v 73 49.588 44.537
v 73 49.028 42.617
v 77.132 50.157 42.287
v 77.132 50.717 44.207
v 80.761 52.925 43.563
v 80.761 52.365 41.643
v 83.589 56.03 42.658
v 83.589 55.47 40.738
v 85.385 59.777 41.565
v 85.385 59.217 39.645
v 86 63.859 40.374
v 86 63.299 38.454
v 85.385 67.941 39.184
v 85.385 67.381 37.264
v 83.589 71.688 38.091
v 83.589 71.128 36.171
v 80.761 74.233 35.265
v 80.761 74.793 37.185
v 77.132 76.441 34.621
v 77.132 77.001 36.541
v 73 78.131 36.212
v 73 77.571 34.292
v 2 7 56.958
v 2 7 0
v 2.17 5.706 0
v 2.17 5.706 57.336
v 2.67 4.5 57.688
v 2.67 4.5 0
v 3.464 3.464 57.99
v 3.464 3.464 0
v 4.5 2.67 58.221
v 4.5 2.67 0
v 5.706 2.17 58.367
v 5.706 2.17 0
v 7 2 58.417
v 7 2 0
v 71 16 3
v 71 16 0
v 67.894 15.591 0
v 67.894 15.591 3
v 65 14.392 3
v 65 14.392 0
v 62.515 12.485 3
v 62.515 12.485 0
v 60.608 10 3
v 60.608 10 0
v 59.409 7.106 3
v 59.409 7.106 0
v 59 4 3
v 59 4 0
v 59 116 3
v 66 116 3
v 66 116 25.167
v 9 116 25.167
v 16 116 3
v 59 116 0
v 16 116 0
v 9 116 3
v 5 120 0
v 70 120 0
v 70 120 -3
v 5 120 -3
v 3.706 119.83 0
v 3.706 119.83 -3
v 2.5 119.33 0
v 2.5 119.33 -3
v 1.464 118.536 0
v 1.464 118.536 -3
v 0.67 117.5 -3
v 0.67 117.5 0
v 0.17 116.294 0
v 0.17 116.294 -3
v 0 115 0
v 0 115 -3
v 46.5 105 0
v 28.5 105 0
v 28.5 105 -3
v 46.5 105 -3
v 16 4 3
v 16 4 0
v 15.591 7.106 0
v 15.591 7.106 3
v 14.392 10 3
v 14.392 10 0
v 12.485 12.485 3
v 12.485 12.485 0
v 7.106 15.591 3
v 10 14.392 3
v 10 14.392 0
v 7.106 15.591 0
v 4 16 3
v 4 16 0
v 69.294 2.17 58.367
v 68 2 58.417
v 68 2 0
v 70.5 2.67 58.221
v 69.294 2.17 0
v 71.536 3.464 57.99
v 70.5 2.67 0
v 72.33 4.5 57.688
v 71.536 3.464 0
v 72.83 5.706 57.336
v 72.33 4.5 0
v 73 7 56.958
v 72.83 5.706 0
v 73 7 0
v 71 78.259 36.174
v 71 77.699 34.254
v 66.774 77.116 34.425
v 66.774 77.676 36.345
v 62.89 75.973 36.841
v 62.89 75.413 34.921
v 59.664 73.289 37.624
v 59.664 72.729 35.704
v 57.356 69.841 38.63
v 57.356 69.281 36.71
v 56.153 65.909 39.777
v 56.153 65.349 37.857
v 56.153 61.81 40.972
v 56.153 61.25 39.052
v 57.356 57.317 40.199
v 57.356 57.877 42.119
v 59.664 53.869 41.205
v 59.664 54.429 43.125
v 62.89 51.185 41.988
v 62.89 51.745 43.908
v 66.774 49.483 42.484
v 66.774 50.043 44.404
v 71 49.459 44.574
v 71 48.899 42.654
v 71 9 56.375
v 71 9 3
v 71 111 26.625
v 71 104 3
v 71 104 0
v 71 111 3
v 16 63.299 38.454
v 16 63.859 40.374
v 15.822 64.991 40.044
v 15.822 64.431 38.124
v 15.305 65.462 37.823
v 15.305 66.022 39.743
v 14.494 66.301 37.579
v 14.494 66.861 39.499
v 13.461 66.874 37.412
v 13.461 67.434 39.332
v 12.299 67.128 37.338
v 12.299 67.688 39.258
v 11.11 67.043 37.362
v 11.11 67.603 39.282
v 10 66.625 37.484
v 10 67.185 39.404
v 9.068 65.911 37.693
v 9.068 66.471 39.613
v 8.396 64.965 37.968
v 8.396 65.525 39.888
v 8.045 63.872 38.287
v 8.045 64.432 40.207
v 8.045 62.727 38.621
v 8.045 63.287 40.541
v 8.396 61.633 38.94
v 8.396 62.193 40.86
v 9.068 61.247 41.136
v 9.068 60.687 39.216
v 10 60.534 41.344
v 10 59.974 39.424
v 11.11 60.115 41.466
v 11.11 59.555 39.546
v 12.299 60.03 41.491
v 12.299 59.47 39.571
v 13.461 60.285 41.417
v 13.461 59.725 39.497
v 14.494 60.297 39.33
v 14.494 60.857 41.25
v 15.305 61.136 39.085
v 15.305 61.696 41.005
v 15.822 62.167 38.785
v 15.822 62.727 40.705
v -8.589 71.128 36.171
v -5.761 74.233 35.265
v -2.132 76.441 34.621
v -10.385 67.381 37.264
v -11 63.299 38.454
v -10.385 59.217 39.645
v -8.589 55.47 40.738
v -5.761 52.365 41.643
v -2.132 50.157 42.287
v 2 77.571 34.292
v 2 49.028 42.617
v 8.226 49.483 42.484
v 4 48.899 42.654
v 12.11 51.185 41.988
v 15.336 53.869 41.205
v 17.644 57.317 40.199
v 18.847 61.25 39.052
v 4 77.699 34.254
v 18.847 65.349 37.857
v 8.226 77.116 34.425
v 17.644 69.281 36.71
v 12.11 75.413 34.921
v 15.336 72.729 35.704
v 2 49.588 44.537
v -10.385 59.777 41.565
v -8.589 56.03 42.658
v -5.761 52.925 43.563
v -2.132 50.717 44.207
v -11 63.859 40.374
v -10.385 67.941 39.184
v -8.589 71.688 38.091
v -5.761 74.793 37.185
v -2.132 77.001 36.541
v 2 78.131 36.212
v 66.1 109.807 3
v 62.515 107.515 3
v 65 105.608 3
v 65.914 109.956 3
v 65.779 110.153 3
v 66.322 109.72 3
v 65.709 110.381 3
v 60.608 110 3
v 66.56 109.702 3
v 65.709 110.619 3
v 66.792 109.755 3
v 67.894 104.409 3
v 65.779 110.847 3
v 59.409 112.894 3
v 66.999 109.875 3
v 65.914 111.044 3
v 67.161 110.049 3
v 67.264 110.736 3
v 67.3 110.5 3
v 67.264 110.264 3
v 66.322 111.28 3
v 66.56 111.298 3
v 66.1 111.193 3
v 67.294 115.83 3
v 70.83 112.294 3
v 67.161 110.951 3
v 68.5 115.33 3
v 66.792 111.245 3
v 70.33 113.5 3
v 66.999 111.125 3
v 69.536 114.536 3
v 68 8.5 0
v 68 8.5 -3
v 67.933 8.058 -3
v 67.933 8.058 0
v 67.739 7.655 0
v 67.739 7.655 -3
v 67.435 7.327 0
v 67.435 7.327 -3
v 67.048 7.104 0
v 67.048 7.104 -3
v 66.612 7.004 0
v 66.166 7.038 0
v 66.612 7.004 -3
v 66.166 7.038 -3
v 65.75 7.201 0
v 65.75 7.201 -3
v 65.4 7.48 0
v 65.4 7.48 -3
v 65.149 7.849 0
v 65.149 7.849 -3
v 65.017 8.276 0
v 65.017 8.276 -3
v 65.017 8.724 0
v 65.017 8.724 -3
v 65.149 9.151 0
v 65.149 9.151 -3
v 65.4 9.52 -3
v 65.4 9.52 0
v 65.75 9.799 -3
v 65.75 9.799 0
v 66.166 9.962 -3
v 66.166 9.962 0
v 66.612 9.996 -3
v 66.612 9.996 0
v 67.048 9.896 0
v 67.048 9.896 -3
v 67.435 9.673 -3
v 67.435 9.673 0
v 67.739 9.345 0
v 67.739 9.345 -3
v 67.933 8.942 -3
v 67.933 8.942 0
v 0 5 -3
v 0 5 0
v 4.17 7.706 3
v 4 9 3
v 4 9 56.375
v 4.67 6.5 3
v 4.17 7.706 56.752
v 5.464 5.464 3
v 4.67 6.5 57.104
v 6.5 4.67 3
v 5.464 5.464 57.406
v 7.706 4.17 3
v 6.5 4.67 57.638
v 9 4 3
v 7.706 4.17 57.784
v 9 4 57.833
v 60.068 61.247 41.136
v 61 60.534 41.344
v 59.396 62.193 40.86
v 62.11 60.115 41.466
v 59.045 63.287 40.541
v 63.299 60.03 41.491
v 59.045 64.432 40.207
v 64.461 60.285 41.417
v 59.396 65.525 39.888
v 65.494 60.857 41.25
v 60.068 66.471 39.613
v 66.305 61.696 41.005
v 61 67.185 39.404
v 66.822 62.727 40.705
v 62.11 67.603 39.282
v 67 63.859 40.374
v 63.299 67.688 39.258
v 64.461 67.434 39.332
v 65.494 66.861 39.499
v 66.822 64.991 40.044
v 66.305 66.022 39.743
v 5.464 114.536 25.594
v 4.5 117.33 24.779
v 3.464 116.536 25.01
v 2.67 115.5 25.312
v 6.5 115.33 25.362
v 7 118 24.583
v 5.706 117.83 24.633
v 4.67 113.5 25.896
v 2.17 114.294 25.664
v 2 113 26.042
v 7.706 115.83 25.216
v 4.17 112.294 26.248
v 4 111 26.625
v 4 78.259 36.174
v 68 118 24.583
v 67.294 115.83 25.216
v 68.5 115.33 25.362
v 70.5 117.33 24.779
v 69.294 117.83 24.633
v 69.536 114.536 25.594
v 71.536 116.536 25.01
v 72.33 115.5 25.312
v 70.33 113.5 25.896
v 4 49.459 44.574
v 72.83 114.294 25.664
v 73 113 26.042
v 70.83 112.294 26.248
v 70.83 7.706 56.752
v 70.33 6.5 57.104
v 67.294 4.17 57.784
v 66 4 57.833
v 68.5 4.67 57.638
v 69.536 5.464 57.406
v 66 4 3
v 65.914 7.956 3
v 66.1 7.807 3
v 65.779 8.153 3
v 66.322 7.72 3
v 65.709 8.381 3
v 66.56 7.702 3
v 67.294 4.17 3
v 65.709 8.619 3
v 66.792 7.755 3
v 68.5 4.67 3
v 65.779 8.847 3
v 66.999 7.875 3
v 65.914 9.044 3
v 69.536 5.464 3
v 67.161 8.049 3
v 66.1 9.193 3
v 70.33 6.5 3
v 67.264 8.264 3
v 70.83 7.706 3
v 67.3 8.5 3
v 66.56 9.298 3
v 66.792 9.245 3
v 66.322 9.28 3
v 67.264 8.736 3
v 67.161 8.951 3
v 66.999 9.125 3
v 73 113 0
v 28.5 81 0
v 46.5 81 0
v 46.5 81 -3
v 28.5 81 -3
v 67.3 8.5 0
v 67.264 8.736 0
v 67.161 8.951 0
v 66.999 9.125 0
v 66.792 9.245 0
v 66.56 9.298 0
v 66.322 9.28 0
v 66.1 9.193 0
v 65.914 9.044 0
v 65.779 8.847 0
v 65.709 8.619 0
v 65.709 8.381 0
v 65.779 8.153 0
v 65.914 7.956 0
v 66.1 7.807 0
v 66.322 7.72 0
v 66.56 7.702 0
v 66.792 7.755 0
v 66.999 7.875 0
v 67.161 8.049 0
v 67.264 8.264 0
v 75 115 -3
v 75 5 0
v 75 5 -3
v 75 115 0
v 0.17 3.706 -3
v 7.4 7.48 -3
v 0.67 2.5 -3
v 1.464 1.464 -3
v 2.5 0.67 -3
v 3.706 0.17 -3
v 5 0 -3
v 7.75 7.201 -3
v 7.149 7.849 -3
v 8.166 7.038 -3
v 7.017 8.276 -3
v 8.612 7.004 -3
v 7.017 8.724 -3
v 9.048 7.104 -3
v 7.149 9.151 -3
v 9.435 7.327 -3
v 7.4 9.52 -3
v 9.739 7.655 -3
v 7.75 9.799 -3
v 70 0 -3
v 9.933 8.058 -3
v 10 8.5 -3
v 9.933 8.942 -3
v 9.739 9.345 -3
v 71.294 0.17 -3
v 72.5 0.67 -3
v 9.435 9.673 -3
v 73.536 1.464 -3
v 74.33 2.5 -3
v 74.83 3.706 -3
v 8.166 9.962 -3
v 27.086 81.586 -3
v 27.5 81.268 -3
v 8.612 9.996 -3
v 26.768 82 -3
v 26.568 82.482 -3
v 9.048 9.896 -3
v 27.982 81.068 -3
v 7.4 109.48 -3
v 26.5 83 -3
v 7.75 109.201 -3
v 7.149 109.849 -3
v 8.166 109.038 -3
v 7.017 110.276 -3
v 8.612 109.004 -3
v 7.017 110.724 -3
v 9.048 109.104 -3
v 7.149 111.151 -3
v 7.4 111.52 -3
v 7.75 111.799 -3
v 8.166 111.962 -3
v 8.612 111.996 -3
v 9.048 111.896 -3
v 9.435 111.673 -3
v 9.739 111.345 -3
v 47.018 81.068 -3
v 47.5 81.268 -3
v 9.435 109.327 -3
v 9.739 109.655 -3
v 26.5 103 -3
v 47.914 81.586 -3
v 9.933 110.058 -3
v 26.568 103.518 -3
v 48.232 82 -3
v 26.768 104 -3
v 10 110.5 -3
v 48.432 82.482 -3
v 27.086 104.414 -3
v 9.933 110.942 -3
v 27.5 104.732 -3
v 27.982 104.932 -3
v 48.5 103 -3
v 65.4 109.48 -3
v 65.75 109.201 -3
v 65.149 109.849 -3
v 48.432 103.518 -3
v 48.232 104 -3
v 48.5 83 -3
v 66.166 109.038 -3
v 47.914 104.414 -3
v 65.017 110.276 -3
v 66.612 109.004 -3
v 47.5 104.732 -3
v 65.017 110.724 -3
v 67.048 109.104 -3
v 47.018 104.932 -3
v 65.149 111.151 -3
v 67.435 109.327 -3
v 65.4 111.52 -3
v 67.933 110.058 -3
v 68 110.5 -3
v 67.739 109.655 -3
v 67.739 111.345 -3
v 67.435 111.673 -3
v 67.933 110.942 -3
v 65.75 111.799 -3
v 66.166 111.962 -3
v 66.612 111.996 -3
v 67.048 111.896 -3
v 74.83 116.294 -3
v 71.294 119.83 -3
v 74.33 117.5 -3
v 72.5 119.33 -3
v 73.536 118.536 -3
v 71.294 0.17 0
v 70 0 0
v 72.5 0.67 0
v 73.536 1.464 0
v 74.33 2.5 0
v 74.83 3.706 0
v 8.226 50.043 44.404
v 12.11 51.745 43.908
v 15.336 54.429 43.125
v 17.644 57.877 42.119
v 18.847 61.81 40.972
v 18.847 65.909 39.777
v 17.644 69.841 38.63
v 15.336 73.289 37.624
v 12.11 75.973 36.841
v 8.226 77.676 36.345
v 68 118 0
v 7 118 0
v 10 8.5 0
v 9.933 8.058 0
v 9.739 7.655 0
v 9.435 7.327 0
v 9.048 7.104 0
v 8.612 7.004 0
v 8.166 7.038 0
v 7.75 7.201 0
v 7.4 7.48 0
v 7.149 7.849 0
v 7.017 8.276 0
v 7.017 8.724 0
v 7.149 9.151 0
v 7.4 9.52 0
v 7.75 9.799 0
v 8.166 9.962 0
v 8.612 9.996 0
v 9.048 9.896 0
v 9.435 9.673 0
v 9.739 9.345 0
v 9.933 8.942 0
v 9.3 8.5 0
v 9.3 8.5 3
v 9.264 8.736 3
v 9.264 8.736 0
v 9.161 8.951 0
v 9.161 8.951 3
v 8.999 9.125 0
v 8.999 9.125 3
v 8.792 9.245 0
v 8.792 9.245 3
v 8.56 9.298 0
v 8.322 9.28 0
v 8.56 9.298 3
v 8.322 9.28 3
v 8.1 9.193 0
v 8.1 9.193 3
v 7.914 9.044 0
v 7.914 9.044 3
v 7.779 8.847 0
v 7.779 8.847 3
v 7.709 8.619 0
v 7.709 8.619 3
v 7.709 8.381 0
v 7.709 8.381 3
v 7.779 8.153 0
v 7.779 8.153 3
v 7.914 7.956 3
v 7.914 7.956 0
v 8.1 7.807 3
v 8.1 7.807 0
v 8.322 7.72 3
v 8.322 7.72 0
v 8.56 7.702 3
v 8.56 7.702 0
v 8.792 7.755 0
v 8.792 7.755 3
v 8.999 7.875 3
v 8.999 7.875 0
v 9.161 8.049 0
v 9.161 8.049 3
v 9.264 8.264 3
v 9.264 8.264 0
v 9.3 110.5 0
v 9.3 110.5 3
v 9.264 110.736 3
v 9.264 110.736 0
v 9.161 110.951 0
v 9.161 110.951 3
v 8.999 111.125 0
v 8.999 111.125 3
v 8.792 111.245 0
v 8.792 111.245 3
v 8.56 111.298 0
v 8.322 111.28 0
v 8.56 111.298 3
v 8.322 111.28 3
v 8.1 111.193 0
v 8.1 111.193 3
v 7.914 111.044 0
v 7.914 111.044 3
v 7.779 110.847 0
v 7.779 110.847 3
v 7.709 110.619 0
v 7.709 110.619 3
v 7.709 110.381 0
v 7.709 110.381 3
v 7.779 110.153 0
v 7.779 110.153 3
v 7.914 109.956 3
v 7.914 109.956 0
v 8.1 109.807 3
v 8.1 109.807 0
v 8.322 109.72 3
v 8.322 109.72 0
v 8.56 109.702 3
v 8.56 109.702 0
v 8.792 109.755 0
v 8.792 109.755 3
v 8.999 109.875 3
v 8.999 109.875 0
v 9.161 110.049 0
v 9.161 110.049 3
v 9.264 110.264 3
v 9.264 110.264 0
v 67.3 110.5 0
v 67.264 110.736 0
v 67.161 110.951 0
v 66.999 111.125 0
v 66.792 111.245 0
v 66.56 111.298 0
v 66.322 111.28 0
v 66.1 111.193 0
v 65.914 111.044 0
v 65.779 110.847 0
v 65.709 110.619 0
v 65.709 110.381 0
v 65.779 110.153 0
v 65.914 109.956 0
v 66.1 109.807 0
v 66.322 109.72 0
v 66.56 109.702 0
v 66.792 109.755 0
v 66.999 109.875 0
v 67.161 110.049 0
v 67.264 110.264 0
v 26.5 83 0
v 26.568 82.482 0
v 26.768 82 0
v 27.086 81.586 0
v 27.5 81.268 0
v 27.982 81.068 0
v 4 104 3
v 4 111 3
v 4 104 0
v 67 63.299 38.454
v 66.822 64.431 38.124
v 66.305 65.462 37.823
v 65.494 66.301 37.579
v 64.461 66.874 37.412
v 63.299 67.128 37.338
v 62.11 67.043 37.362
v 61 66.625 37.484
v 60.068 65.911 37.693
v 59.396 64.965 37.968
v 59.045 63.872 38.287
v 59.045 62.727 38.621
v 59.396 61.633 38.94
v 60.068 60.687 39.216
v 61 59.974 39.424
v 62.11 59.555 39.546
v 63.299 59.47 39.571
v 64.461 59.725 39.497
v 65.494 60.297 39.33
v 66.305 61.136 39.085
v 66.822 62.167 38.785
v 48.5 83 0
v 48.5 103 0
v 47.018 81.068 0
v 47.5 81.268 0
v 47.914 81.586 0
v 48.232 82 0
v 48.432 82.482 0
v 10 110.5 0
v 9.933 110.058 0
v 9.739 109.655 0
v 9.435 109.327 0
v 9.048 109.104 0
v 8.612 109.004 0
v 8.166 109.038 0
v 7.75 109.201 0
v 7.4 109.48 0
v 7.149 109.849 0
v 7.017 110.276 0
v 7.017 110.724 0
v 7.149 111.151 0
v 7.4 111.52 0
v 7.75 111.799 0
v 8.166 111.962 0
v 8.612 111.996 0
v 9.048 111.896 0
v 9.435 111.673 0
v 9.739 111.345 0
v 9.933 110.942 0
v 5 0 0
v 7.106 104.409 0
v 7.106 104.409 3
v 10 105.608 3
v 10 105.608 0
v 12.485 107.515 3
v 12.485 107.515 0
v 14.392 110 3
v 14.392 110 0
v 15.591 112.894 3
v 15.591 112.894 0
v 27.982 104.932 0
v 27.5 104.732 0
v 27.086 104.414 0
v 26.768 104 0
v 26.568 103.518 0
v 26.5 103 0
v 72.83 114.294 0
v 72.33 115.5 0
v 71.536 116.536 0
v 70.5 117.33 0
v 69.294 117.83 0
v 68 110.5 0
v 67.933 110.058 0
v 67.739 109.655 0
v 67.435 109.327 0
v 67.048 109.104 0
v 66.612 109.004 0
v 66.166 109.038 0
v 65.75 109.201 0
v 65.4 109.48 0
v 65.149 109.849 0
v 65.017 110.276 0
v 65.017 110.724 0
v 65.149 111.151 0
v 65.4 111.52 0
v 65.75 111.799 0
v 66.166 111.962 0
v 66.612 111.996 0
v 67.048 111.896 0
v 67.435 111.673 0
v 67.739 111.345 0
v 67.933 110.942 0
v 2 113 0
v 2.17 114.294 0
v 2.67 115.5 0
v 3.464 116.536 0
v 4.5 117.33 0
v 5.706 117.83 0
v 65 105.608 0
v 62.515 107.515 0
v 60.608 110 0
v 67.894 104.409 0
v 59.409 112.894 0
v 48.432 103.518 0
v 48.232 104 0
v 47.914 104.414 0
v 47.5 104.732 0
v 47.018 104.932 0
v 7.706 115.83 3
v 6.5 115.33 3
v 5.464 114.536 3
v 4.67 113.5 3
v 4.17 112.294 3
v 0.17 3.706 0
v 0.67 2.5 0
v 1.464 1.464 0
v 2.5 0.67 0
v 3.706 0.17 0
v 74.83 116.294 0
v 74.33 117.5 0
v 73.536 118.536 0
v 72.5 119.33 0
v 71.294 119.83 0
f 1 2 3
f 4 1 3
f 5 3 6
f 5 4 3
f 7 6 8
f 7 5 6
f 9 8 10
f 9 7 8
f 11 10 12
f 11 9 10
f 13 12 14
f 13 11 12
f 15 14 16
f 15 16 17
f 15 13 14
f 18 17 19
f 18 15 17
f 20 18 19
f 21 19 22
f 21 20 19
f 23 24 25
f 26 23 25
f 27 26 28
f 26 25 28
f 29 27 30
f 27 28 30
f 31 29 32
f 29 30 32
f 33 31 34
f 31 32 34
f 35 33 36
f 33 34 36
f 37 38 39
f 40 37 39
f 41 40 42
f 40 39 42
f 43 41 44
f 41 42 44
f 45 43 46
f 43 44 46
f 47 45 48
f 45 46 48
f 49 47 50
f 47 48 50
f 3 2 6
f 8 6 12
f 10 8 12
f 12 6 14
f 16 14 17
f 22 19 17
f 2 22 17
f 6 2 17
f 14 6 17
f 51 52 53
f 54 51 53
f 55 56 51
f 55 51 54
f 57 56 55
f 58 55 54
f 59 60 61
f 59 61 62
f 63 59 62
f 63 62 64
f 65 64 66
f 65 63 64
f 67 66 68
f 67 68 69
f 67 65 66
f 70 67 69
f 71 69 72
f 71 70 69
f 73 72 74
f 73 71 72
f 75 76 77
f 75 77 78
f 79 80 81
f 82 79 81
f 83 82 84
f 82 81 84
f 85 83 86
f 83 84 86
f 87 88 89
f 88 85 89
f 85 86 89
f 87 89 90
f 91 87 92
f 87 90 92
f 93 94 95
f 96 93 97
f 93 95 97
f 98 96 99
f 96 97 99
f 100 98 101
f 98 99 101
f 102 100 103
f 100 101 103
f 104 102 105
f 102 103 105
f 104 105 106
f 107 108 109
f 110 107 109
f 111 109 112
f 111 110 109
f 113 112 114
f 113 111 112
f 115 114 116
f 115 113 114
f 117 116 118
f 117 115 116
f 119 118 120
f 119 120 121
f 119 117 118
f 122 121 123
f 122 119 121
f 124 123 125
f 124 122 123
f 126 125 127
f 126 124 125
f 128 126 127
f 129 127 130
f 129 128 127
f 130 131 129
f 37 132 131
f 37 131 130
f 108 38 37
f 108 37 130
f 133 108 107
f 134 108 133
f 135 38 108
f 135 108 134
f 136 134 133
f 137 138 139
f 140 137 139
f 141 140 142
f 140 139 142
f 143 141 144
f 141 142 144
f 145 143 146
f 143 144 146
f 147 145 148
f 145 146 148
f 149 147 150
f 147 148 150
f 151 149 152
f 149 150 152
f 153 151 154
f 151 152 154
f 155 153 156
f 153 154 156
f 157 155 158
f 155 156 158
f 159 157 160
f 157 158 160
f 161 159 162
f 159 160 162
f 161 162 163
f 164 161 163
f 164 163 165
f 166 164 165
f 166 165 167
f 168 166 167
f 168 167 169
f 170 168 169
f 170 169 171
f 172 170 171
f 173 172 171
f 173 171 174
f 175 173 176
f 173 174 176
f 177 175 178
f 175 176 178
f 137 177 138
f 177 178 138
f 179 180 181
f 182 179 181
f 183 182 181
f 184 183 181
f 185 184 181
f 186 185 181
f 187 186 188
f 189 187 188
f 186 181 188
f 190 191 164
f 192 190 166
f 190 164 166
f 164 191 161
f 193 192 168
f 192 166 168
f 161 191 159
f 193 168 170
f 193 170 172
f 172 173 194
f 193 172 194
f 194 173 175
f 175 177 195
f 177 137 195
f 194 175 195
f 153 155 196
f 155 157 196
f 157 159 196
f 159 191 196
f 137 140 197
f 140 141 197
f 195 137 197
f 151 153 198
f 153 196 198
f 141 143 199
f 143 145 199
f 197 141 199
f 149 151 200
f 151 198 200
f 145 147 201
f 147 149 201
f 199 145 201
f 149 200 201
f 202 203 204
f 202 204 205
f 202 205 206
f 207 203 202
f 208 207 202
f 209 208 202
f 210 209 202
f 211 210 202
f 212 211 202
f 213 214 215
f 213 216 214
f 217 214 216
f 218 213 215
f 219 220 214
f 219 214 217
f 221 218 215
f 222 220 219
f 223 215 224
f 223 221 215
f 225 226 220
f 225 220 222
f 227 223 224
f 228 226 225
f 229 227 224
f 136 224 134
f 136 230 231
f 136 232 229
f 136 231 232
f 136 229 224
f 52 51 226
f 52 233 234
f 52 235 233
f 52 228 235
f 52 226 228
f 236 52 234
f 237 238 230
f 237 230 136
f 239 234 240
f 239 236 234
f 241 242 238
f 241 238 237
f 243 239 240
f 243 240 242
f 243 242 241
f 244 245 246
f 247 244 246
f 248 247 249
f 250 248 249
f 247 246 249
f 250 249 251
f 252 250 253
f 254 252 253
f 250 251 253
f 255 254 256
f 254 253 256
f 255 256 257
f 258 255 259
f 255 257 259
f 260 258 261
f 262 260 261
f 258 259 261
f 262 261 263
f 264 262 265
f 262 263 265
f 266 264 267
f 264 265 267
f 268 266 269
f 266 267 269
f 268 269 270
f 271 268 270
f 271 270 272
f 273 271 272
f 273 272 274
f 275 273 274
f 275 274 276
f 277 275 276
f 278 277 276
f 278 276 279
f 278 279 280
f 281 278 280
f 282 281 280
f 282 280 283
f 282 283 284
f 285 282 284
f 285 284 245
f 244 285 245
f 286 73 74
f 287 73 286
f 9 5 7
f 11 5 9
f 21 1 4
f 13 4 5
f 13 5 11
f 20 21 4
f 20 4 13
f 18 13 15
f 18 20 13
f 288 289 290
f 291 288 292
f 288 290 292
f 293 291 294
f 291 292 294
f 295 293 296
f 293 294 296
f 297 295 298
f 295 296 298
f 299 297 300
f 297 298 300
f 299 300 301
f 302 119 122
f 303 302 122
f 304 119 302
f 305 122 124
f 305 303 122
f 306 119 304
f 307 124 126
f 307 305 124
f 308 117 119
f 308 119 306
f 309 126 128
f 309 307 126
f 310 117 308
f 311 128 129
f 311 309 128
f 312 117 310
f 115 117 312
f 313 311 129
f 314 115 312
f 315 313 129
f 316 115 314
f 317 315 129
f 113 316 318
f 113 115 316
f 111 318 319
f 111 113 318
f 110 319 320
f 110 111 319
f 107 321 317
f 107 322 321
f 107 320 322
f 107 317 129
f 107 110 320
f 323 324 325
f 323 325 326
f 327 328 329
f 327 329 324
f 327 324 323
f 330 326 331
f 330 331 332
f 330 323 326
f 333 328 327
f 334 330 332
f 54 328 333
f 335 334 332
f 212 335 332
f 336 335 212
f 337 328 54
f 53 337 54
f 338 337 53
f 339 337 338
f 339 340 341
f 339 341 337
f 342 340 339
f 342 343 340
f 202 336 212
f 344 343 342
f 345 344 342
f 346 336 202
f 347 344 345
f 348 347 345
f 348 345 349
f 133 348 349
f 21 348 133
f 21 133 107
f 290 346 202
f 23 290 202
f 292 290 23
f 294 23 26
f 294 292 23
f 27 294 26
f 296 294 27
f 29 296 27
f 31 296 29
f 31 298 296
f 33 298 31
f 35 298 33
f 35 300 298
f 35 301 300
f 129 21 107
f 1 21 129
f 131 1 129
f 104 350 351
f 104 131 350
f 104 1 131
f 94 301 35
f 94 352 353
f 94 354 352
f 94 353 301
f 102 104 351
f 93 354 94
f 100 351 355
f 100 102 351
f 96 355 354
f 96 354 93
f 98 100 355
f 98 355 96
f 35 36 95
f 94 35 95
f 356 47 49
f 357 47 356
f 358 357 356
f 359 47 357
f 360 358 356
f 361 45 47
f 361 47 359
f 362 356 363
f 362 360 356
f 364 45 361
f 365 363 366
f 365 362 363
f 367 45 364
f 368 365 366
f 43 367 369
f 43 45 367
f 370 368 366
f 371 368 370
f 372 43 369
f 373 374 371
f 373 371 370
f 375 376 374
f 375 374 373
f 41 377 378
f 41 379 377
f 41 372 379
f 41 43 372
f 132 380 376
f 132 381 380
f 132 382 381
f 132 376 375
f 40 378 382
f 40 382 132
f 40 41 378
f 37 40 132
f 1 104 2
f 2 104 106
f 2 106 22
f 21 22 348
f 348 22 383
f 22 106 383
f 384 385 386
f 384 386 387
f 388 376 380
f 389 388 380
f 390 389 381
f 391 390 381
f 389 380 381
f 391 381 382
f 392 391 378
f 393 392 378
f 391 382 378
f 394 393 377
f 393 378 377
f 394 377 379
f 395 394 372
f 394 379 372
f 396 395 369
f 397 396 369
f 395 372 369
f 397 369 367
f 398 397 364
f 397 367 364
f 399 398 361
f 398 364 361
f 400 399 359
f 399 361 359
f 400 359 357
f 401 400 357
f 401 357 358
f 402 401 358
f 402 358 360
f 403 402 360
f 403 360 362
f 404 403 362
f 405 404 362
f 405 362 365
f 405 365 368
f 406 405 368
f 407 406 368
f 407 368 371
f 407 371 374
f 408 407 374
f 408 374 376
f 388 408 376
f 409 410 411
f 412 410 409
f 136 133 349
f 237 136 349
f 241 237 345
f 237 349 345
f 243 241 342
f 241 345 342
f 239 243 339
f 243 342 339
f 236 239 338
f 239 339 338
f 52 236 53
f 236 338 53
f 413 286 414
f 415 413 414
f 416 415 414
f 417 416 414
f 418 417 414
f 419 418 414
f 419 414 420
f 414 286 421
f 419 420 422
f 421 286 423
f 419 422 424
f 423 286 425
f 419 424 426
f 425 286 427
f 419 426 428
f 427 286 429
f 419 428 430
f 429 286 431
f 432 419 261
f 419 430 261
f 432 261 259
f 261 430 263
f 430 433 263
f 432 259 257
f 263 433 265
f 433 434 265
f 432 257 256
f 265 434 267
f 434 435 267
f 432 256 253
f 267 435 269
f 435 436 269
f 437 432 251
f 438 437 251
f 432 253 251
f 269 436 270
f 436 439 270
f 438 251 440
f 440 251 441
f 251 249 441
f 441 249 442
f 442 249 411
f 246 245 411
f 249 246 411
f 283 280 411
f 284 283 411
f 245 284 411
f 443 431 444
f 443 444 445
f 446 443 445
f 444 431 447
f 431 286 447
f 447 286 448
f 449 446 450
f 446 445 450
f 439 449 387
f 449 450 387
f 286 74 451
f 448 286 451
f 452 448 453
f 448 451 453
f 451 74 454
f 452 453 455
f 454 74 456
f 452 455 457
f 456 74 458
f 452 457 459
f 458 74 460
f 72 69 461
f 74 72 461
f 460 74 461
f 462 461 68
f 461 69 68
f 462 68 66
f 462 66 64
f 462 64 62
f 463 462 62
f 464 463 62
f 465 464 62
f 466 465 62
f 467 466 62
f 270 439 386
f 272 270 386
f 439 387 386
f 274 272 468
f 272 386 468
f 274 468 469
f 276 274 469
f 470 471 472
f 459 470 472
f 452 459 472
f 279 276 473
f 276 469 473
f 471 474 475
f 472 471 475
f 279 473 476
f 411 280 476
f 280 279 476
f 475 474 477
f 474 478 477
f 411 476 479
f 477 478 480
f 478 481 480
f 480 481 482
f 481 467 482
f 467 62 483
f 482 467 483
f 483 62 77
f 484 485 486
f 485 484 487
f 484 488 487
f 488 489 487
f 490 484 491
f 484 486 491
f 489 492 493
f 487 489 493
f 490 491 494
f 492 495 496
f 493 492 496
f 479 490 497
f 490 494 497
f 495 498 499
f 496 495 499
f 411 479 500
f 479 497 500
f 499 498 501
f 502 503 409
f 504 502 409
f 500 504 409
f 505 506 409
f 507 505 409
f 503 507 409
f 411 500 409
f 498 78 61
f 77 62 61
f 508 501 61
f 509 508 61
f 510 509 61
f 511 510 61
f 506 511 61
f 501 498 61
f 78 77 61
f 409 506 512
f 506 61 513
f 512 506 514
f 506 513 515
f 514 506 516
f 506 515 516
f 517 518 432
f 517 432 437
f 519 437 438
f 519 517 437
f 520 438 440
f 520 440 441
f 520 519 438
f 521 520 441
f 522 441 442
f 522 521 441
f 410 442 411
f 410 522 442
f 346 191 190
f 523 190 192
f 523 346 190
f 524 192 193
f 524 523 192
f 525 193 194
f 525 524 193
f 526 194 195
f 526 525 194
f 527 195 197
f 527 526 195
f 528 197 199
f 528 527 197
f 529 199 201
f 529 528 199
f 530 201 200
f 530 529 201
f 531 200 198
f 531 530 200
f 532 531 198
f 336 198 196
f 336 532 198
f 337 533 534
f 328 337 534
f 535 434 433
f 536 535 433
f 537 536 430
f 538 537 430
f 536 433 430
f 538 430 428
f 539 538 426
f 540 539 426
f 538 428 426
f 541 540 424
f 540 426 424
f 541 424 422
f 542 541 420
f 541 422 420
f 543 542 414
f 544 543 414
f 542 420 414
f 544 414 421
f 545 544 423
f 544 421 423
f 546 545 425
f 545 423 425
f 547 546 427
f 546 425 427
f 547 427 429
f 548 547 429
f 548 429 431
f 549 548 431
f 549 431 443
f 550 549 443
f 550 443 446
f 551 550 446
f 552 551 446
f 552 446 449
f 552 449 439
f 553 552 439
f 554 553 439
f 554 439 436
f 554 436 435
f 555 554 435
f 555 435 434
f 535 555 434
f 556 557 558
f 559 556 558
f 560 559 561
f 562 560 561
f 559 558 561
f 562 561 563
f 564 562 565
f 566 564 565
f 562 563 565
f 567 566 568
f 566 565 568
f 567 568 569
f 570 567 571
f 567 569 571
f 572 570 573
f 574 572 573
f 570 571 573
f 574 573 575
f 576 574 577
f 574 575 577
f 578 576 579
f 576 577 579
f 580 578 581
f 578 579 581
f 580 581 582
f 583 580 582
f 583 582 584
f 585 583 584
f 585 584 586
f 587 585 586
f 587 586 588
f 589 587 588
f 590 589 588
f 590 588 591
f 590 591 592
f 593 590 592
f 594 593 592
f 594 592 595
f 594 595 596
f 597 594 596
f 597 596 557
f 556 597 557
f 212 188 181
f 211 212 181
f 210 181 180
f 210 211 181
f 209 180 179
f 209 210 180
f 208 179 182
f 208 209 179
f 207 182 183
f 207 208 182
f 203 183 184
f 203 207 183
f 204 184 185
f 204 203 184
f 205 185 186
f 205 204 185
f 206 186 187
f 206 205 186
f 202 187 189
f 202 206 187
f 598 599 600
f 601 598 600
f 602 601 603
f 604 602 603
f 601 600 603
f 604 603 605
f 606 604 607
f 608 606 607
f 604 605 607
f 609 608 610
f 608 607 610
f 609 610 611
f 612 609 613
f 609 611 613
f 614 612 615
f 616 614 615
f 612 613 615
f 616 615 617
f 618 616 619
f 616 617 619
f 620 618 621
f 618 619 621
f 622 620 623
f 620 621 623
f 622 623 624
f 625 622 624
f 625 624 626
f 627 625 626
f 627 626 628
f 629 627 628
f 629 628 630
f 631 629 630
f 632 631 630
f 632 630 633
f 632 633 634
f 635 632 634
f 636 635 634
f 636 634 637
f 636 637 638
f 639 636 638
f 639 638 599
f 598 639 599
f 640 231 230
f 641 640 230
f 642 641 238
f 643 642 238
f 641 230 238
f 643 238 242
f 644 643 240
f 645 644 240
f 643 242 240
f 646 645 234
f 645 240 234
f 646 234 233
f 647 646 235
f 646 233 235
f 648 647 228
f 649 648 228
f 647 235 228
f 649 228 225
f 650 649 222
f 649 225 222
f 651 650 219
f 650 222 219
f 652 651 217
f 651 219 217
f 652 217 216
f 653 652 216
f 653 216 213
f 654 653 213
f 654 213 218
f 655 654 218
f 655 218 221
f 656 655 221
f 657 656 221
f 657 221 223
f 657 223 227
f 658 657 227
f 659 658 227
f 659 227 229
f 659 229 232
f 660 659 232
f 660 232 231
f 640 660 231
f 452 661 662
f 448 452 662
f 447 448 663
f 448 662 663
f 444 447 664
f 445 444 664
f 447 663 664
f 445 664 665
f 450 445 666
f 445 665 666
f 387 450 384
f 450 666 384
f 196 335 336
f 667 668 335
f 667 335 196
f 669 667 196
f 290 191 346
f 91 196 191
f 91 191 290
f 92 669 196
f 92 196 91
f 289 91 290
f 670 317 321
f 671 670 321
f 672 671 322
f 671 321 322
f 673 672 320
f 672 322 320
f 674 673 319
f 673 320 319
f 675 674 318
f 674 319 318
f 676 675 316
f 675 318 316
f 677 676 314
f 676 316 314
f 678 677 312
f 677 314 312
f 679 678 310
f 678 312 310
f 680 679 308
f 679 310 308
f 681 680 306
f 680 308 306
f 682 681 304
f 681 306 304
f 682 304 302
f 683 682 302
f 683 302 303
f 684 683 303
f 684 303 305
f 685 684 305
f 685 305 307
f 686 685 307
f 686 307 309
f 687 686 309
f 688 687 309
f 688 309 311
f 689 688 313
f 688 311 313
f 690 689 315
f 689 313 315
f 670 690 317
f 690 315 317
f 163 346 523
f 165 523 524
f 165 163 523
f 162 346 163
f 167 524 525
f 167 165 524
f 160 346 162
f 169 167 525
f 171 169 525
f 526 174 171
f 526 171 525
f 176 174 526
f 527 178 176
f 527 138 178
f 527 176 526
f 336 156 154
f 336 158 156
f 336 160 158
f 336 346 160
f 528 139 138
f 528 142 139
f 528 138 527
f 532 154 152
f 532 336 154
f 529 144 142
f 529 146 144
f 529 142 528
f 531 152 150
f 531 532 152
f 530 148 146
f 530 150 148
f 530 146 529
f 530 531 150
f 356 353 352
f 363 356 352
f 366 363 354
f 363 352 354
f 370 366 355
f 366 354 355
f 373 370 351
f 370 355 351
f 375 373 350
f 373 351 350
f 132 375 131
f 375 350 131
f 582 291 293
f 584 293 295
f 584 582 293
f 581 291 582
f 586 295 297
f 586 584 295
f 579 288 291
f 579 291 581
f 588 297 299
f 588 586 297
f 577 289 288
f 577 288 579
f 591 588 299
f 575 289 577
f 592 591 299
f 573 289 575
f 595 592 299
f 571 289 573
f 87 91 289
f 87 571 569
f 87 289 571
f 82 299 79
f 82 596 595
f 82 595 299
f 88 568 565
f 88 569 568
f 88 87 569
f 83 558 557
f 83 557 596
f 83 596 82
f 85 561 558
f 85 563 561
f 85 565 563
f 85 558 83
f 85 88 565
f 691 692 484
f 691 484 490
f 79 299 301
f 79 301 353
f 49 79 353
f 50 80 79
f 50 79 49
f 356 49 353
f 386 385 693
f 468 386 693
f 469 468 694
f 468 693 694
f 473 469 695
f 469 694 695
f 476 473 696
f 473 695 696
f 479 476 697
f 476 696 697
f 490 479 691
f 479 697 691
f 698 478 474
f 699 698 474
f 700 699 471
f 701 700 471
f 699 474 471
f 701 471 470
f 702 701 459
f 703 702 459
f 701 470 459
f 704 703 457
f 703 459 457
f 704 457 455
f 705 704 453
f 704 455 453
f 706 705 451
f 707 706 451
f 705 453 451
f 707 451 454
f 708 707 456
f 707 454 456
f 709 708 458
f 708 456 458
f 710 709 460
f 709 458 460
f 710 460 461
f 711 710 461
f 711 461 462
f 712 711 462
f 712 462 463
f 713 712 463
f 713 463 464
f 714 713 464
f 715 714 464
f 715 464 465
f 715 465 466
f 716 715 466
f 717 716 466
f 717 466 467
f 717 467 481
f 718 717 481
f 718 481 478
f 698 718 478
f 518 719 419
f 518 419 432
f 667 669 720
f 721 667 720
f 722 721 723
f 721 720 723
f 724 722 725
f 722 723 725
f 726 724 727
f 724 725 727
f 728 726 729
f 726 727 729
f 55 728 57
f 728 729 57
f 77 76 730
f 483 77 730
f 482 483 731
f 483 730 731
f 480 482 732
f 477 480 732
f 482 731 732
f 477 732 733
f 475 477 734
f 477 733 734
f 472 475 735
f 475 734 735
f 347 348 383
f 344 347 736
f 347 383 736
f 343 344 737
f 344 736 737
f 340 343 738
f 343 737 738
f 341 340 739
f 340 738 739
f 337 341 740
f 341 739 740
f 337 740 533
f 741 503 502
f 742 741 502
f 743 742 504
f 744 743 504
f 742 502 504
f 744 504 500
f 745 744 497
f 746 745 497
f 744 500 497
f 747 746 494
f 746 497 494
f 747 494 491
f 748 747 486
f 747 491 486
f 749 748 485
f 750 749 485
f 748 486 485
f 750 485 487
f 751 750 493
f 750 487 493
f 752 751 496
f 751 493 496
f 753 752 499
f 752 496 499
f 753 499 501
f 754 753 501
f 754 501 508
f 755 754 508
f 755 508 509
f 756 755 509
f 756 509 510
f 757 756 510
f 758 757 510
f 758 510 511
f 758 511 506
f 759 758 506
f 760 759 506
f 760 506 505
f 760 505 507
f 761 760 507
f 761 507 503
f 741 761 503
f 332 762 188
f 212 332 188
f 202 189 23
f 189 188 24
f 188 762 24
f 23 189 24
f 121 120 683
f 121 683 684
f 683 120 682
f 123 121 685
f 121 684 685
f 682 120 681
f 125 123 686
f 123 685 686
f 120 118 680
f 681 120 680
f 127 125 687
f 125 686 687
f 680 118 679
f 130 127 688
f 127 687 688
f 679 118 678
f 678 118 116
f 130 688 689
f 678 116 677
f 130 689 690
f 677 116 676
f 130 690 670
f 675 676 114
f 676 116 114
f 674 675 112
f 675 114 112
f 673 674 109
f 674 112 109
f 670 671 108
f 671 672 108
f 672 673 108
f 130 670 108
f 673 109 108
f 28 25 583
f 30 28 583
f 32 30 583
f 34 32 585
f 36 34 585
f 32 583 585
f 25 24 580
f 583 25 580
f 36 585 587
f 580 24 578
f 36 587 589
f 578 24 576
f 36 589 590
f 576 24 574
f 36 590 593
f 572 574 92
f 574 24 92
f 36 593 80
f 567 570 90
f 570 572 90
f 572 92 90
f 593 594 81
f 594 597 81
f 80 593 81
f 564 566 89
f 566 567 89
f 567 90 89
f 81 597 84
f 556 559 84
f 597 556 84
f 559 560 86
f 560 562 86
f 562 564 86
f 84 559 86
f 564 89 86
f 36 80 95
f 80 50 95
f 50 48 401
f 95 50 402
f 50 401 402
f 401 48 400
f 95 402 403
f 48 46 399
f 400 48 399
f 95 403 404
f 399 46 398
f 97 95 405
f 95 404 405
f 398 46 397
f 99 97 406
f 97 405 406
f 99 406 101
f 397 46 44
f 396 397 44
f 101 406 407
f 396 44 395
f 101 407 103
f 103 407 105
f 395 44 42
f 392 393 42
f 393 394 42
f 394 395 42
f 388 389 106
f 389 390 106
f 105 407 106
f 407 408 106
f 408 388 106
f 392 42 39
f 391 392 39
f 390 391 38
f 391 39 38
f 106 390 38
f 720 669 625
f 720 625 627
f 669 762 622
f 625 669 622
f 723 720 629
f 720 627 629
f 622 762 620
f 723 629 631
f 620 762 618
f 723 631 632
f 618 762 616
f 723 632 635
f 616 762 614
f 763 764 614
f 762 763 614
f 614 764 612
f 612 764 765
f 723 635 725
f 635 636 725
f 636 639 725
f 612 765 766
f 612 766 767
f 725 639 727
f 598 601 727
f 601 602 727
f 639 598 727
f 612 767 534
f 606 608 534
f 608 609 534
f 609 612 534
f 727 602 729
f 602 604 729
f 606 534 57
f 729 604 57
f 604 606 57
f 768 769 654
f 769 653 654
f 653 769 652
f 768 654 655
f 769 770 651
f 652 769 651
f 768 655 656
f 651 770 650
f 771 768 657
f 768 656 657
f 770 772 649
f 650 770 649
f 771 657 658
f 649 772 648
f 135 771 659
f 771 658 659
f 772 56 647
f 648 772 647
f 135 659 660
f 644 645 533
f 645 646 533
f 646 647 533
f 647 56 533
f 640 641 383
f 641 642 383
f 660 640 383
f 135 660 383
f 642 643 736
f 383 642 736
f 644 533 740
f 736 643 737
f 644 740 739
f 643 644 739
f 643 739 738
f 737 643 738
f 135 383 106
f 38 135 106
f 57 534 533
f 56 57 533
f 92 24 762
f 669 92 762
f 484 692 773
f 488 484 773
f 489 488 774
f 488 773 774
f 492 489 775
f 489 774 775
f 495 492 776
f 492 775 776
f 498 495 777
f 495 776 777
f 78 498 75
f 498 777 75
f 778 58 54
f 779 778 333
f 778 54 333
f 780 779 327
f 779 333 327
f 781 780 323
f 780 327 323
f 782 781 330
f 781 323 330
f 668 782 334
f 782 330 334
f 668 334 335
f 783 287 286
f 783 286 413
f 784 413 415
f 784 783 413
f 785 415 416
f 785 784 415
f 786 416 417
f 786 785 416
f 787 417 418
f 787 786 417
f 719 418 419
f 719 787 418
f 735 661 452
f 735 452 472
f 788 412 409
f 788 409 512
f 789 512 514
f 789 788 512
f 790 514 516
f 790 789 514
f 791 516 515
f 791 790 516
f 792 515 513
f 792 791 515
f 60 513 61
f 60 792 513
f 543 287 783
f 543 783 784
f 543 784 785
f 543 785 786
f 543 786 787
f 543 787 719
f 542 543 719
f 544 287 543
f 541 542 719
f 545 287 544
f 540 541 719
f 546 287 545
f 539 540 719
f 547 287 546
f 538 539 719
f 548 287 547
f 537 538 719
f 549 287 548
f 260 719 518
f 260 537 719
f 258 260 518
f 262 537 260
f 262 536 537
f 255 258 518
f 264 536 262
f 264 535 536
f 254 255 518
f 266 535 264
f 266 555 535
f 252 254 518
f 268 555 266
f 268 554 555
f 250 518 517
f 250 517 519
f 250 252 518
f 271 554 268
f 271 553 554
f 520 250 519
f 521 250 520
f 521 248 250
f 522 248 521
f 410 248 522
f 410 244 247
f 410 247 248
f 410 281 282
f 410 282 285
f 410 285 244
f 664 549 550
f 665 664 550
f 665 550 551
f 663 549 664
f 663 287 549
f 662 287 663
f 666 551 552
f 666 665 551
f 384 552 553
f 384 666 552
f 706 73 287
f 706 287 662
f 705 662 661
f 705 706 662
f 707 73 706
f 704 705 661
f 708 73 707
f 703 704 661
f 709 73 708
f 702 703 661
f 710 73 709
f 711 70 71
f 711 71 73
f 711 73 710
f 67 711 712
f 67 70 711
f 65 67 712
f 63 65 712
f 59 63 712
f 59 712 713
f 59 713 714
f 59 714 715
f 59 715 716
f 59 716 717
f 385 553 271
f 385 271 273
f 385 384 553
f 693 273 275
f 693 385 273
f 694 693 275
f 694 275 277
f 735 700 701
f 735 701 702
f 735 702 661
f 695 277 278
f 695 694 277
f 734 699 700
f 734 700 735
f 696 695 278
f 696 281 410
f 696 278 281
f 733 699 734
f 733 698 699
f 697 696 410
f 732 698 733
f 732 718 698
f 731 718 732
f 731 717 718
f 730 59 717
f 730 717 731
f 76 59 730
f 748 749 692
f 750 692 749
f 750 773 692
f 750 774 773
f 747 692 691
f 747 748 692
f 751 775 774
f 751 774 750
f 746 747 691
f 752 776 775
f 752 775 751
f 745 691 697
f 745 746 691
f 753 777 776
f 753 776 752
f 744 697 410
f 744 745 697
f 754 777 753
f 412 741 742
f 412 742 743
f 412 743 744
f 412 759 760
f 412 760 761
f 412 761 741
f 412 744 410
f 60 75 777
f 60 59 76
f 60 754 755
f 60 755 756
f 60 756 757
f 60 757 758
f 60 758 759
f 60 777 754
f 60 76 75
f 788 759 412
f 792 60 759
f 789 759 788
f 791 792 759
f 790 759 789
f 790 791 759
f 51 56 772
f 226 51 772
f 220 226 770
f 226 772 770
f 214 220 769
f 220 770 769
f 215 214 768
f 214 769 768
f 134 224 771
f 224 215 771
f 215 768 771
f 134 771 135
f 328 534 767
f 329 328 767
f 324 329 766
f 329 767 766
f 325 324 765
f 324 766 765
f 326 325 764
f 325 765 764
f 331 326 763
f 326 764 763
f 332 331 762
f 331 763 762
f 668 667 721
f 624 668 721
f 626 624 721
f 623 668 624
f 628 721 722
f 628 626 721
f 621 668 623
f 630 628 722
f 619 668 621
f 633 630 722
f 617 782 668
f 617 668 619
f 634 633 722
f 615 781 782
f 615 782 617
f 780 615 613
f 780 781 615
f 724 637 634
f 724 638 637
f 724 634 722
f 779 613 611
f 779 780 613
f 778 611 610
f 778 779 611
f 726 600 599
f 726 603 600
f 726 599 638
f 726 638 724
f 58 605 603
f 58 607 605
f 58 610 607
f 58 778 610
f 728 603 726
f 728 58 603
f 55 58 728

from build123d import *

# Parameters (mm, degrees)
PAD001_DEPTH    = 60
POCKET_DEPTH    = 57
SKETCH006_R     = 0.8
POCKET001_DEPTH = 3.001
POCKET002_DEPTH = 71.001
SKETCH008_R     = 15
SKETCH008_R_2   = 4
PAD002_DEPTH    = 2
PAD_DEPTH       = 3
SKETCH009_R     = 1.5
POCKET003_DEPTH = 5


with BuildPart() as pad002:
    # Sketch004 → Pad001 (new body)
    with BuildSketch(Plane.XY):
        with BuildLine():
            Line((7, 2), (68, 2))
            ThreePointArc((68, 2), (71.535534, 3.464466), (73, 7))
            Line((73, 7), (73, 113))
            ThreePointArc((73, 113), (71.535534, 116.535534), (68, 118))
            Line((68, 118), (7, 118))
            ThreePointArc((7, 118), (3.464466, 116.535534), (2, 113))
            Line((2, 113), (2, 7))
            ThreePointArc((2, 7), (3.464466, 3.464466), (7, 2))
        make_face()
        with BuildLine():
            Line((16, 4), (59, 4))
            ThreePointArc((71, 16), (62.514719, 12.485281), (59, 4))
            Line((71, 16), (71, 104))
            ThreePointArc((59, 116), (62.514719, 107.514719), (71, 104))
            Line((59, 116), (16, 116))
            ThreePointArc((4, 104), (12.485281, 107.514719), (16, 116))
            Line((4, 104), (4, 16))
            ThreePointArc((16, 4), (12.485281, 12.485281), (4, 16))
        make_face(mode=Mode.SUBTRACT)
    extrude(amount=PAD001_DEPTH)

    # Sketch003 → Pocket (cut)
    with BuildSketch(Plane.XY.offset(60)):
        with BuildLine():
            Line((9, 4), (66, 4))
            ThreePointArc((66, 4), (69.535534, 5.464466), (71, 9))
            Line((71, 9), (71, 111))
            ThreePointArc((71, 111), (69.535534, 114.535534), (66, 116))
            Line((66, 116), (9, 116))
            ThreePointArc((9, 116), (5.464466, 114.535534), (4, 111))
            Line((4, 111), (4, 9))
            ThreePointArc((4, 9), (5.464466, 5.464466), (9, 4))
        make_face()
    extrude(amount=-POCKET_DEPTH, mode=Mode.SUBTRACT)

    # Sketch006 → Pocket001 (cut, through all)
    with BuildSketch(Plane.XY.offset(3)):
        with Locations((8.5, 110.5)):
            Circle(SKETCH006_R)
        with Locations((66.5, 110.5)):
            Circle(SKETCH006_R)
        with Locations((8.5, 8.5)):
            Circle(SKETCH006_R)
        with Locations((66.5, 8.5)):
            Circle(SKETCH006_R)
    extrude(amount=-POCKET001_DEPTH, mode=Mode.SUBTRACT)

    # Sketch005 → Pocket002 (cut, through all)
    with BuildSketch(Plane.YZ.offset(73)):
        Polygon((202.285714, 0), (0, 59), (0, 90.06), (202.285714, 90.06), align=None)
    extrude(amount=-POCKET002_DEPTH, mode=Mode.SUBTRACT)

    # Sketch008 → Pad002 (new body)
    with BuildSketch(Plane(origin=(0, 15.8592, 54.3744), x_dir=(1, 0, 0), z_dir=(0, 0.28, 0.96))):
        with Locations((4, 50)):
            Circle(SKETCH008_R)
        with Locations((12, 50)):
            Circle(SKETCH008_R_2, mode=Mode.SUBTRACT)
        with Locations((71, 50)):
            Circle(SKETCH008_R)
        with Locations((63, 50)):
            Circle(SKETCH008_R_2, mode=Mode.SUBTRACT)
    extrude(amount=-PAD002_DEPTH)


with BuildPart() as pocket003:
    # Sketch → Pad (new body)
    with BuildSketch(Plane.XY):
        with BuildLine():
            Line((5, 0), (70, 0))
            ThreePointArc((70, 0), (73.535534, 1.464466), (75, 5))
            Line((75, 5), (75, 115))
            ThreePointArc((75, 115), (73.535534, 118.535534), (70, 120))
            Line((70, 120), (5, 120))
            ThreePointArc((5, 120), (1.464466, 118.535534), (0, 115))
            Line((0, 115), (0, 5))
            ThreePointArc((0, 5), (1.464466, 1.464466), (5, 0))
        make_face()
        with BuildLine():
            Line((28.5, 105), (46.5, 105))
            ThreePointArc((48.5, 103), (47.914214, 104.414214), (46.5, 105))
            Line((48.5, 103), (48.5, 83))
            ThreePointArc((46.5, 81), (47.914214, 81.585786), (48.5, 83))
            Line((46.5, 81), (28.5, 81))
            ThreePointArc((26.5, 83), (27.085786, 81.585786), (28.5, 81))
            Line((26.5, 83), (26.5, 103))
            ThreePointArc((28.5, 105), (27.085786, 104.414214), (26.5, 103))
        make_face(mode=Mode.SUBTRACT)
    extrude(amount=-PAD_DEPTH)

    # Sketch009 → Pocket003 (cut)
    with BuildSketch(Plane(origin=(0, 0, -3), x_dir=(1, 0, 0), z_dir=(0, 0, -1))):
        with Locations((66.5, -8.5)):
            Circle(SKETCH009_R)
        with Locations((8.5, -110.5)):
            Circle(SKETCH009_R)
        with Locations((66.5, -110.5)):
            Circle(SKETCH009_R)
        with Locations((8.5, -8.5)):
            Circle(SKETCH009_R)
    extrude(amount=-POCKET003_DEPTH, mode=Mode.SUBTRACT)


solid = Compound([pad002.part, pocket003.part])
